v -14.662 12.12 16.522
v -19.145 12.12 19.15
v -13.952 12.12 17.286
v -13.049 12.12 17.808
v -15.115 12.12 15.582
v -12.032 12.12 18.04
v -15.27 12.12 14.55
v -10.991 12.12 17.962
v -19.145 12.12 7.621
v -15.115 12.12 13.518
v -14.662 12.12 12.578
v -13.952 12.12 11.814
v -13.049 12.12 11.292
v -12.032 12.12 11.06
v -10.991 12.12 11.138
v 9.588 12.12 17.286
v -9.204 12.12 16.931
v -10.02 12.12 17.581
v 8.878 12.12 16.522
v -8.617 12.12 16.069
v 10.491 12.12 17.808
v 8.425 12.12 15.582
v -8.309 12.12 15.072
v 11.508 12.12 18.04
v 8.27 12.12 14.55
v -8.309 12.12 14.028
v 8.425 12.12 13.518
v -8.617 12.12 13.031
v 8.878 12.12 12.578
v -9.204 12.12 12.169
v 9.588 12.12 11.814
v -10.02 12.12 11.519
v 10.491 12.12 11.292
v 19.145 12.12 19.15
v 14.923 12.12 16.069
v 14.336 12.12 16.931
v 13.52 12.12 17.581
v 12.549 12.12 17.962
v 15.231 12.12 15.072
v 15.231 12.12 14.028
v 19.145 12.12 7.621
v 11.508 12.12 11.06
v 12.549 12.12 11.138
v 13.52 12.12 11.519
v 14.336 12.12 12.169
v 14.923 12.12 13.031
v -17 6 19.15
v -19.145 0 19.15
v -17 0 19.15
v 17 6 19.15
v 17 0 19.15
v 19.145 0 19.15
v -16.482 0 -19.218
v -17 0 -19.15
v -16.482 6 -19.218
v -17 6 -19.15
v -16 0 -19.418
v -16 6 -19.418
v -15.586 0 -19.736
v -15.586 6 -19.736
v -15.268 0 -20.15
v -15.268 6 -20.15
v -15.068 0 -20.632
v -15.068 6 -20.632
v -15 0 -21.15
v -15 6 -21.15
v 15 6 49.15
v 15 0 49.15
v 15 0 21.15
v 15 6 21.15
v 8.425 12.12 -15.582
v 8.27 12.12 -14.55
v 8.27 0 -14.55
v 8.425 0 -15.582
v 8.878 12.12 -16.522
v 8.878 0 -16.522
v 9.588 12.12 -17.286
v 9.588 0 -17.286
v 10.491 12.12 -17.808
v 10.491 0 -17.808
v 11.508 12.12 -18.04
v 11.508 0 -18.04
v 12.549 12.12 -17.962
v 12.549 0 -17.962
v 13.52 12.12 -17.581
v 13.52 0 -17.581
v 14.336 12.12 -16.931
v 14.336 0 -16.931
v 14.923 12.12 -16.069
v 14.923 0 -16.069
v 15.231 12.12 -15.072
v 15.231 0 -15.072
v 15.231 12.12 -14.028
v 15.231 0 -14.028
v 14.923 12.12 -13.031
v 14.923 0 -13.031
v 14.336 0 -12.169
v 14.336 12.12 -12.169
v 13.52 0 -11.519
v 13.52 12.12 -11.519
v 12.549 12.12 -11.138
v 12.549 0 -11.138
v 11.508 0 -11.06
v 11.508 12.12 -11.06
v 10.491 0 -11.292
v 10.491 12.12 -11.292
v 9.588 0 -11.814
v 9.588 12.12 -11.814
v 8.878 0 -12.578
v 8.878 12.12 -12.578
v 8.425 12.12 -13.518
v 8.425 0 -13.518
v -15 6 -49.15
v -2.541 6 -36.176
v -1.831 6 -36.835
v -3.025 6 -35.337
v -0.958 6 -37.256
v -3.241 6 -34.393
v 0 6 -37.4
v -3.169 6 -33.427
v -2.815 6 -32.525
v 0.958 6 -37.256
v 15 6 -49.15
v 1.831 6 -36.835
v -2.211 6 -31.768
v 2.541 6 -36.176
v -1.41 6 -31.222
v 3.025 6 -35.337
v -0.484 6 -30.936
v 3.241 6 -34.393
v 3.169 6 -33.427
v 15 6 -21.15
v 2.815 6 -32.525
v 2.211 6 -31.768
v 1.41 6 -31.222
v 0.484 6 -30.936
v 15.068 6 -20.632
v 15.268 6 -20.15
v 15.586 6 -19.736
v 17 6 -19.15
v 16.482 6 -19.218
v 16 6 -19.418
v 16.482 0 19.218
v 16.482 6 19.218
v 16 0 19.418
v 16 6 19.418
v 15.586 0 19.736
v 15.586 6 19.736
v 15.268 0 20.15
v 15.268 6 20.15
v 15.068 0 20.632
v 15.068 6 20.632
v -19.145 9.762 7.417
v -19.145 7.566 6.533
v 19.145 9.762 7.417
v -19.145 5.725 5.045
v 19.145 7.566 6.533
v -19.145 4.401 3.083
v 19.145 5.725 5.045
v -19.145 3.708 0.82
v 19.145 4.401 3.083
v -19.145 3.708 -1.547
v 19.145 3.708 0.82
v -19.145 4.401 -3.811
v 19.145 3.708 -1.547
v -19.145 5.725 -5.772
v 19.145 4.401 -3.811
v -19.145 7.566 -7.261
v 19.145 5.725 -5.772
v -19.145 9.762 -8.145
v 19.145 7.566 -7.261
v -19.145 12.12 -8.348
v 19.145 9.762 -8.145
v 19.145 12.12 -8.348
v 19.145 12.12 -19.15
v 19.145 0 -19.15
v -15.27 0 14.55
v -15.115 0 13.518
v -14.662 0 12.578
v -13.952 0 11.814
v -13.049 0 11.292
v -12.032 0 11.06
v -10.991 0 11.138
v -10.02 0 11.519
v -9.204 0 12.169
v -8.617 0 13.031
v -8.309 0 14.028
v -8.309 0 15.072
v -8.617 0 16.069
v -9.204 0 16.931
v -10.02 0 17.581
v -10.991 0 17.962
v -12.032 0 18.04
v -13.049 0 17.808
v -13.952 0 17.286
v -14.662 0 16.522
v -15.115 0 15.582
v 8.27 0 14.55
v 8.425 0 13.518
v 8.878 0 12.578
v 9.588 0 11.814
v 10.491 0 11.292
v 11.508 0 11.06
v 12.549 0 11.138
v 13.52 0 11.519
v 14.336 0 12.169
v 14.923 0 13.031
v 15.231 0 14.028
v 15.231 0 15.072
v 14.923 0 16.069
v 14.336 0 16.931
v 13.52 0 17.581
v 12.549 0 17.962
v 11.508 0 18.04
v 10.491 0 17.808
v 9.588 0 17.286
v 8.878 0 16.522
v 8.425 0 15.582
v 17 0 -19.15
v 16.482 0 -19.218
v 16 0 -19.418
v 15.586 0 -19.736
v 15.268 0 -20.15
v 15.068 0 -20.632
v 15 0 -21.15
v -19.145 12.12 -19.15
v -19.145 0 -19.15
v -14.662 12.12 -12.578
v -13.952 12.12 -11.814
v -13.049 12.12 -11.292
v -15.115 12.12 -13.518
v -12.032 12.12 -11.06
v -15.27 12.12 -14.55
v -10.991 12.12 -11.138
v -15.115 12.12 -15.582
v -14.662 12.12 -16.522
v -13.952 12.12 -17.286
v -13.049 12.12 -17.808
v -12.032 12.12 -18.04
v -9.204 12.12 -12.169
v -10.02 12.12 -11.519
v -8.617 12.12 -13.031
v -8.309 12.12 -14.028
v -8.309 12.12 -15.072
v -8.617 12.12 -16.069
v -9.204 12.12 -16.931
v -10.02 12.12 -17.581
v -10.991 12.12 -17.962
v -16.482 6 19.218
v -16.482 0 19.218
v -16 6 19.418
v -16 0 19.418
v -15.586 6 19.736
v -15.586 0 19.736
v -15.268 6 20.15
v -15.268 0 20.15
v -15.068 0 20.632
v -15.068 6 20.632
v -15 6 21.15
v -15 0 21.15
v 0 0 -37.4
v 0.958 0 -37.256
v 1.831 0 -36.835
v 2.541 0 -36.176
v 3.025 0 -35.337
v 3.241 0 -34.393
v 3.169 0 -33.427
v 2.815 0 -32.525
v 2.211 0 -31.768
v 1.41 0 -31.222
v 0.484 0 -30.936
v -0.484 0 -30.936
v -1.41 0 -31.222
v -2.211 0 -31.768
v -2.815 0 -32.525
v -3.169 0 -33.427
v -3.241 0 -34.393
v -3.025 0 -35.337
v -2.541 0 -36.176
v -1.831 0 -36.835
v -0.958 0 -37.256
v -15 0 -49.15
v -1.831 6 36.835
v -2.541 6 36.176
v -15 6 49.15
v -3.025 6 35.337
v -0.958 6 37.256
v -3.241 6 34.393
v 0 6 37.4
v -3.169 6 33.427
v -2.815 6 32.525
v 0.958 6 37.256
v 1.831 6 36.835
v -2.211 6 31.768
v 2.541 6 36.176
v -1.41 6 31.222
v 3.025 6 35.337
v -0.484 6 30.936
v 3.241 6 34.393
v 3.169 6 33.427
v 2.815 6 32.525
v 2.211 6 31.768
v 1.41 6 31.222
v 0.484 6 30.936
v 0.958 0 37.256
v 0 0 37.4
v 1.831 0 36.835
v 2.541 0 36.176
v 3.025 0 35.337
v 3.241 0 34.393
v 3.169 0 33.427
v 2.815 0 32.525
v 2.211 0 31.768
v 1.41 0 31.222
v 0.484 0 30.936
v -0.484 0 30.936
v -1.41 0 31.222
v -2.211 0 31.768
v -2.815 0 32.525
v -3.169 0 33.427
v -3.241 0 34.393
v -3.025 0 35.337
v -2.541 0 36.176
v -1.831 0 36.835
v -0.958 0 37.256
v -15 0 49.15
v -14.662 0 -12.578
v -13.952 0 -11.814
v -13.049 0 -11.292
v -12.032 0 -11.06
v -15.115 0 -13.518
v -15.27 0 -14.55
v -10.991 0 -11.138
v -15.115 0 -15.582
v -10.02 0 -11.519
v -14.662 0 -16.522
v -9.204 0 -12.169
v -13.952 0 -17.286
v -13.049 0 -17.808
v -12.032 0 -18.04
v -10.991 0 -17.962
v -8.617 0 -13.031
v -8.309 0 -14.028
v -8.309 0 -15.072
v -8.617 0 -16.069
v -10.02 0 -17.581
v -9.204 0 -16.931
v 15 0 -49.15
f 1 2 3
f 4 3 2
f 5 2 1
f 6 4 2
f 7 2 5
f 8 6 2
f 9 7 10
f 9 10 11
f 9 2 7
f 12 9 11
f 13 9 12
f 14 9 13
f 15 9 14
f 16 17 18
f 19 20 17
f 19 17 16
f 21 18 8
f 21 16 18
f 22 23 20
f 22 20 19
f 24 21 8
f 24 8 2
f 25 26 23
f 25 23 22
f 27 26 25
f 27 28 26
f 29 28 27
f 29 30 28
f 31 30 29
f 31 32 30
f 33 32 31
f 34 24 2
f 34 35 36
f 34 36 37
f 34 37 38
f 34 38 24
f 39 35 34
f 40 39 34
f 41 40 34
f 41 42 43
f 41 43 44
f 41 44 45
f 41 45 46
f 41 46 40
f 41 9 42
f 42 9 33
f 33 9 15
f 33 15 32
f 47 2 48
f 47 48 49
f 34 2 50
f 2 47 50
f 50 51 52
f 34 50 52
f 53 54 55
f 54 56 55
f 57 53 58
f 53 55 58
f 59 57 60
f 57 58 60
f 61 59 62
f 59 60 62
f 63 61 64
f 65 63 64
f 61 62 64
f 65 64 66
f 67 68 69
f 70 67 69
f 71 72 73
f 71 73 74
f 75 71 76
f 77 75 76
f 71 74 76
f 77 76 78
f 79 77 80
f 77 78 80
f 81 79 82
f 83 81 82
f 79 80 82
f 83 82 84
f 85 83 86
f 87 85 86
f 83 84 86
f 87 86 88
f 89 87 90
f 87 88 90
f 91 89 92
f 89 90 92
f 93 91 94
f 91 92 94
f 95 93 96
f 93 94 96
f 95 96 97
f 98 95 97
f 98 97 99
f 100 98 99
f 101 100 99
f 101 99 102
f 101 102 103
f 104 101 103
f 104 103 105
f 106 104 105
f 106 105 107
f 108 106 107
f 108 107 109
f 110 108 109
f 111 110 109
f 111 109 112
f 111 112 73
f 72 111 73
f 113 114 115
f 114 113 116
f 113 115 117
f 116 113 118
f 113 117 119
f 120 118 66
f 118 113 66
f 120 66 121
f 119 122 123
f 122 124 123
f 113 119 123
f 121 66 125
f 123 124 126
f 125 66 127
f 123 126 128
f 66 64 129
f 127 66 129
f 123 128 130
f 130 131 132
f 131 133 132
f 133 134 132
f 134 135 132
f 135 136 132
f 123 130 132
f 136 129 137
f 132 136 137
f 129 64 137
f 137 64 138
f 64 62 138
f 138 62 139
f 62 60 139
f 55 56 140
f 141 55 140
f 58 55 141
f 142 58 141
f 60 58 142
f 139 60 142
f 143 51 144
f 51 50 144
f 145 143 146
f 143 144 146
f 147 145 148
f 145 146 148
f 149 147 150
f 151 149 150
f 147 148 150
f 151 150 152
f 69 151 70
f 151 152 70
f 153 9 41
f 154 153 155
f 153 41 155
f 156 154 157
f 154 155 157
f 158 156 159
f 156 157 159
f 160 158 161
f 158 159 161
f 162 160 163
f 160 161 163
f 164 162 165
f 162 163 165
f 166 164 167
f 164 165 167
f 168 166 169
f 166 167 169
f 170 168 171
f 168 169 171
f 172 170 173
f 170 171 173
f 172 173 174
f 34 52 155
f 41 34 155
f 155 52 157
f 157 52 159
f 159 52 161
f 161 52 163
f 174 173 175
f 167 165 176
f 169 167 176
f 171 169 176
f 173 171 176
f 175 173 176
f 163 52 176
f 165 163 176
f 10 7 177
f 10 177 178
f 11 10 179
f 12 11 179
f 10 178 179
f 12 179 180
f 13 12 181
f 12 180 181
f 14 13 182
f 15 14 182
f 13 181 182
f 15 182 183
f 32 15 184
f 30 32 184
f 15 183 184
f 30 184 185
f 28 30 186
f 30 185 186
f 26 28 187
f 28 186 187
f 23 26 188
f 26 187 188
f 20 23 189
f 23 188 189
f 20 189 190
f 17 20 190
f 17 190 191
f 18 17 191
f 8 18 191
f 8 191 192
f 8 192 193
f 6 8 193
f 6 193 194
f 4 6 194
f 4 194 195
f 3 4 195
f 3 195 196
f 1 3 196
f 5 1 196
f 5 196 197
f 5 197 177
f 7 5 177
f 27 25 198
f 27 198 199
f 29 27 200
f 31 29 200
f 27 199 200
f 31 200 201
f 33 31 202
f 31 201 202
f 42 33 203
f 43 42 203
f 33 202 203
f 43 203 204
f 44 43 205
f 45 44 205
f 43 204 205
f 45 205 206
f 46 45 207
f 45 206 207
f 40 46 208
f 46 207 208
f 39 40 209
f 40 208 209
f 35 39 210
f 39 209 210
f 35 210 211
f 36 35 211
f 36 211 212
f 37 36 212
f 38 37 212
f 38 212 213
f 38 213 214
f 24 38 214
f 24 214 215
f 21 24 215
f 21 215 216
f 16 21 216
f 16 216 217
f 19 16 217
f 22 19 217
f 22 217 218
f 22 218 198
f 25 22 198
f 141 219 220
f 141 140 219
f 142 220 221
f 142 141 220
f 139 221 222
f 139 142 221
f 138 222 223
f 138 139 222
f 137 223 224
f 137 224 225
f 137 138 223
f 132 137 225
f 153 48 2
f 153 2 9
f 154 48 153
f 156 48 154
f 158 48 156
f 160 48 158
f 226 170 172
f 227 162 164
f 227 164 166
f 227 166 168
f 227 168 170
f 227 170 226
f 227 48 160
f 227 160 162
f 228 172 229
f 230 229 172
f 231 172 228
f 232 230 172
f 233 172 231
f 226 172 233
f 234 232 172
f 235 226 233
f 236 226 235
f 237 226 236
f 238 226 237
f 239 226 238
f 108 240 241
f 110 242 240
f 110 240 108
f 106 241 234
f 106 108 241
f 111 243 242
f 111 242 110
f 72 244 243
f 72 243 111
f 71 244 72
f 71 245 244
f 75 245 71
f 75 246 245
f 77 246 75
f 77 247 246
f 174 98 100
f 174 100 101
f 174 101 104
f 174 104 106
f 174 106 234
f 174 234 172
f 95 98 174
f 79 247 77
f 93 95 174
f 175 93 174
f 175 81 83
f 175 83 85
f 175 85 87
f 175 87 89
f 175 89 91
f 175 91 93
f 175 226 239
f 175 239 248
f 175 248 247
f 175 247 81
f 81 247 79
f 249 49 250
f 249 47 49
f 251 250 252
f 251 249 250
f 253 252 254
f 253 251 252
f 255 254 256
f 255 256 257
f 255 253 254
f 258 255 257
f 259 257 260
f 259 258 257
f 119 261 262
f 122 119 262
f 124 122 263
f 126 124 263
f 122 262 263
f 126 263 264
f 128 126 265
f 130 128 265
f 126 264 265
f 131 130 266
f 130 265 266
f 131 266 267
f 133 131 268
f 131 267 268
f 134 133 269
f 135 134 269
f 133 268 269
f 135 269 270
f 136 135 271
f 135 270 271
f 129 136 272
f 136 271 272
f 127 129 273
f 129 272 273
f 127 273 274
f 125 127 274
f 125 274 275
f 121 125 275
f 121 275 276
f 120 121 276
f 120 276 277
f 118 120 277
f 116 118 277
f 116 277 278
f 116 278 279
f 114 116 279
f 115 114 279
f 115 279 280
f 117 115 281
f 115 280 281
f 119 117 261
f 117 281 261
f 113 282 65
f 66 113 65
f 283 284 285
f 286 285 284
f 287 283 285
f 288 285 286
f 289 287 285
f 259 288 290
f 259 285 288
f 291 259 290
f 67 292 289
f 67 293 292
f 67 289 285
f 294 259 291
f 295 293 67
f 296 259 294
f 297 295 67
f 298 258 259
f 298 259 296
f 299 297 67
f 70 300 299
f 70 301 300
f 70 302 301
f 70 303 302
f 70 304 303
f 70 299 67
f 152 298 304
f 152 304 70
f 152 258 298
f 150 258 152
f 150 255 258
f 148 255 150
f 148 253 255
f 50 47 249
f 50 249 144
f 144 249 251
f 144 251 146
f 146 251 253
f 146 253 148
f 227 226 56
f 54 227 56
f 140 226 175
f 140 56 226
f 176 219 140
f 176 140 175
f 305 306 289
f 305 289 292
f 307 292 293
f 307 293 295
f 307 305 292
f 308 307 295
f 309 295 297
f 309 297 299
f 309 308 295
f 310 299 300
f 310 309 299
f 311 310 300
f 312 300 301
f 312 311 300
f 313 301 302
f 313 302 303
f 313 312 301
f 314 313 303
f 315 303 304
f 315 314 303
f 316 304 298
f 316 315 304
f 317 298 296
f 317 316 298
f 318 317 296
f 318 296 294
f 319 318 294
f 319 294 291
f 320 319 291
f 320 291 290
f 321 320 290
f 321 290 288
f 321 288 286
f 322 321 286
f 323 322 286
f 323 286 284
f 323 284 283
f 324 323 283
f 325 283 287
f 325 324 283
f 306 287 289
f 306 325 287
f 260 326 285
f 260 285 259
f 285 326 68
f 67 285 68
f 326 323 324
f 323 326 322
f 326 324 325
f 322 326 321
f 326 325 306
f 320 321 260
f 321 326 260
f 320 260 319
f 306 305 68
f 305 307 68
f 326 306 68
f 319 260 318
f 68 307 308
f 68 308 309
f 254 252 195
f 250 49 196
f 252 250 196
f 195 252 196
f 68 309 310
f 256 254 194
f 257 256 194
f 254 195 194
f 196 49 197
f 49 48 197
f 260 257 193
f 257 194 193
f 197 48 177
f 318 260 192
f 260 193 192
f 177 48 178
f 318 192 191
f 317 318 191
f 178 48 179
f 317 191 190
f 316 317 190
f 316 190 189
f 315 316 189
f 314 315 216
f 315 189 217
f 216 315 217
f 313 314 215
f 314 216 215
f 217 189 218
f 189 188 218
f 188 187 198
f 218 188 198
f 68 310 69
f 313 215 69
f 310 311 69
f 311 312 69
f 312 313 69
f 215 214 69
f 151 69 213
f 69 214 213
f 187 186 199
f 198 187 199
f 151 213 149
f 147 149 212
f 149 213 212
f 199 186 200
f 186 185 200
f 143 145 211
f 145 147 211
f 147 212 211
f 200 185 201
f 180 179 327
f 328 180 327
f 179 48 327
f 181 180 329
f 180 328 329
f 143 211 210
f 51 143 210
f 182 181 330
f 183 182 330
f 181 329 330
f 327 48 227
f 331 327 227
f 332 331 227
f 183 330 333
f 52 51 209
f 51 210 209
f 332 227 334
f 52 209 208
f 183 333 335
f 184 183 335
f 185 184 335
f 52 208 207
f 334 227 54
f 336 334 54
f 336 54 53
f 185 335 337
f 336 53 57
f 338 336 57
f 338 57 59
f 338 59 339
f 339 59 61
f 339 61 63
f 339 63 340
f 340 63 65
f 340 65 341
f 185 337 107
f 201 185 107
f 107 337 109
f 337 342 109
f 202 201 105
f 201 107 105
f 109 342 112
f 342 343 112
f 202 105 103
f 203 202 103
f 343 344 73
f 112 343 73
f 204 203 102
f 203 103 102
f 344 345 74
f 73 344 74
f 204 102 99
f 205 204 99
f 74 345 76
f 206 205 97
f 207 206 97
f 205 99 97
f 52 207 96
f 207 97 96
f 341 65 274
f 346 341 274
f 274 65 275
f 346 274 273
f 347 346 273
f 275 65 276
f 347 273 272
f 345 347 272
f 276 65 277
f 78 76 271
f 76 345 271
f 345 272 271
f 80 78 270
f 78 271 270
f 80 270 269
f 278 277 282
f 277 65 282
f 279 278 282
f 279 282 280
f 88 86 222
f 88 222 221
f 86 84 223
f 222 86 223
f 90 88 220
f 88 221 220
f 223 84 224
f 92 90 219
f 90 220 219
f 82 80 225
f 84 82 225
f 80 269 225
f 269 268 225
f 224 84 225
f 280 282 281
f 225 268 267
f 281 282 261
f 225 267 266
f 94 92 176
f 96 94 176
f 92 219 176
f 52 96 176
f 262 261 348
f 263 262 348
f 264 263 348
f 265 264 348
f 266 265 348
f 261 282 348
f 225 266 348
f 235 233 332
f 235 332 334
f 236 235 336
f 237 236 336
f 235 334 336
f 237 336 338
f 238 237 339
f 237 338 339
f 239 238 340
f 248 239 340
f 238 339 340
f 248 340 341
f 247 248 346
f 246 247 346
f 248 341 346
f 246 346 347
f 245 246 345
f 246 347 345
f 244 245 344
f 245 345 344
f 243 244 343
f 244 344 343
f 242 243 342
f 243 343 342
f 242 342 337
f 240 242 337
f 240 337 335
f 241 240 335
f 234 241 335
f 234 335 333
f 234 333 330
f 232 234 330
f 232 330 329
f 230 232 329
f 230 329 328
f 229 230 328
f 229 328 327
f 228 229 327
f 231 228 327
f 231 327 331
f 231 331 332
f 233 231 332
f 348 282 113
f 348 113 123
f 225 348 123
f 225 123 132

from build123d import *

# Parameters (mm, degrees)
SKETCH1_W                            = 38.29
SKETCH1_H                            = 38.3
BOSS_EXTRUDE1_DEPTH                  = 12.12
SKETCH2_R                            = 8
CUT_EXTRUDE1_DEPTH                   = 45.494280531
M8X1_0_TAPPED_HOLE2_D                = 7
MIRROR1_AT_THE_SECOND_PLANE_COPY_1_D = 7
SKETCH9_W                            = 30
SKETCH9_H                            = 30
SKETCH9_R                            = 3.25
BOSS_EXTRUDE2_DEPTH                  = 6
FILLET1_R                            = 2


with BuildPart() as part:
    # Sketch1 → Boss-Extrude1 (new body)
    with BuildSketch(Plane(origin=(0, 0, 0), x_dir=(1, 0, 0), z_dir=(0, 1, 0))):
        Rectangle(SKETCH1_W, SKETCH1_H)
    extrude(amount=BOSS_EXTRUDE1_DEPTH)

    # Sketch2 → Cut-Extrude1 (cut, through all)
    with BuildSketch(Plane(origin=(19.145, 0, 0), x_dir=(0, 0, -1), z_dir=(1, 0, 0))):
        with Locations((0.363834185, 11.62)):
            Circle(SKETCH2_R)
    extrude(amount=-CUT_EXTRUDE1_DEPTH, mode=Mode.SUBTRACT)

    # M8x1.0 Tapped Hole2 (through all)
    with Locations(Plane(origin=(0, 12.12, 0), x_dir=(1, 0, 0), z_dir=(0, 1, 0))):
        with Locations((-11.77, 14.55), (11.77, 14.55), (-11.77, -14.55), (11.77, -14.55)):
            m8x1_0_tapped_hole2 = Hole(M8X1_0_TAPPED_HOLE2_D / 2)

    # Mirror1: M8x1.0 Tapped Hole2 across plane
    add(m8x1_0_tapped_hole2.mirror(Plane.XY), mode=Mode.SUBTRACT)

    # Mirror1 at the second plane: M8x1.0 Tapped Hole2 across plane
    add(m8x1_0_tapped_hole2.mirror(Plane(origin=(0, 0, 0), x_dir=(0, 0, 1), z_dir=(1, 0, 0))), mode=Mode.SUBTRACT)

    # Mirror1 at the second plane copy 1 (through all)
    with Locations(Plane(origin=(0, 12.12, 0), x_dir=(-1, 0, 0), z_dir=(0, 1, 0))):
        with Locations((-11.77, 14.55), (11.77, 14.55), (-11.77, -14.55), (11.77, -14.55)):
            Hole(MIRROR1_AT_THE_SECOND_PLANE_COPY_1_D / 2)

    # Sketch9 → Boss-Extrude2 (add)
    with BuildSketch(Plane.XZ):
        with Locations((0, -34.15)):
            Rectangle(SKETCH9_W, SKETCH9_H)
        with Locations(Location((0, -34.15, 0), (0, 0, 270))):
            Circle(SKETCH9_R, mode=Mode.SUBTRACT)
    boss_extrude2 = extrude(amount=-BOSS_EXTRUDE2_DEPTH)

    # Mirror2: Boss-Extrude2 across plane
    add(boss_extrude2.mirror(Plane.XY))

    # Fillet1
    fillet1_edges = [part.edges().sort_by_distance(p)[0] for p in [
        (15, 3, 19.15),
        (-15, 3, 19.15),
        (15, 3, -19.15),
        (-15, 3, -19.15),
    ]]
    fillet(fillet1_edges, radius=FILLET1_R)


solid = part.part
